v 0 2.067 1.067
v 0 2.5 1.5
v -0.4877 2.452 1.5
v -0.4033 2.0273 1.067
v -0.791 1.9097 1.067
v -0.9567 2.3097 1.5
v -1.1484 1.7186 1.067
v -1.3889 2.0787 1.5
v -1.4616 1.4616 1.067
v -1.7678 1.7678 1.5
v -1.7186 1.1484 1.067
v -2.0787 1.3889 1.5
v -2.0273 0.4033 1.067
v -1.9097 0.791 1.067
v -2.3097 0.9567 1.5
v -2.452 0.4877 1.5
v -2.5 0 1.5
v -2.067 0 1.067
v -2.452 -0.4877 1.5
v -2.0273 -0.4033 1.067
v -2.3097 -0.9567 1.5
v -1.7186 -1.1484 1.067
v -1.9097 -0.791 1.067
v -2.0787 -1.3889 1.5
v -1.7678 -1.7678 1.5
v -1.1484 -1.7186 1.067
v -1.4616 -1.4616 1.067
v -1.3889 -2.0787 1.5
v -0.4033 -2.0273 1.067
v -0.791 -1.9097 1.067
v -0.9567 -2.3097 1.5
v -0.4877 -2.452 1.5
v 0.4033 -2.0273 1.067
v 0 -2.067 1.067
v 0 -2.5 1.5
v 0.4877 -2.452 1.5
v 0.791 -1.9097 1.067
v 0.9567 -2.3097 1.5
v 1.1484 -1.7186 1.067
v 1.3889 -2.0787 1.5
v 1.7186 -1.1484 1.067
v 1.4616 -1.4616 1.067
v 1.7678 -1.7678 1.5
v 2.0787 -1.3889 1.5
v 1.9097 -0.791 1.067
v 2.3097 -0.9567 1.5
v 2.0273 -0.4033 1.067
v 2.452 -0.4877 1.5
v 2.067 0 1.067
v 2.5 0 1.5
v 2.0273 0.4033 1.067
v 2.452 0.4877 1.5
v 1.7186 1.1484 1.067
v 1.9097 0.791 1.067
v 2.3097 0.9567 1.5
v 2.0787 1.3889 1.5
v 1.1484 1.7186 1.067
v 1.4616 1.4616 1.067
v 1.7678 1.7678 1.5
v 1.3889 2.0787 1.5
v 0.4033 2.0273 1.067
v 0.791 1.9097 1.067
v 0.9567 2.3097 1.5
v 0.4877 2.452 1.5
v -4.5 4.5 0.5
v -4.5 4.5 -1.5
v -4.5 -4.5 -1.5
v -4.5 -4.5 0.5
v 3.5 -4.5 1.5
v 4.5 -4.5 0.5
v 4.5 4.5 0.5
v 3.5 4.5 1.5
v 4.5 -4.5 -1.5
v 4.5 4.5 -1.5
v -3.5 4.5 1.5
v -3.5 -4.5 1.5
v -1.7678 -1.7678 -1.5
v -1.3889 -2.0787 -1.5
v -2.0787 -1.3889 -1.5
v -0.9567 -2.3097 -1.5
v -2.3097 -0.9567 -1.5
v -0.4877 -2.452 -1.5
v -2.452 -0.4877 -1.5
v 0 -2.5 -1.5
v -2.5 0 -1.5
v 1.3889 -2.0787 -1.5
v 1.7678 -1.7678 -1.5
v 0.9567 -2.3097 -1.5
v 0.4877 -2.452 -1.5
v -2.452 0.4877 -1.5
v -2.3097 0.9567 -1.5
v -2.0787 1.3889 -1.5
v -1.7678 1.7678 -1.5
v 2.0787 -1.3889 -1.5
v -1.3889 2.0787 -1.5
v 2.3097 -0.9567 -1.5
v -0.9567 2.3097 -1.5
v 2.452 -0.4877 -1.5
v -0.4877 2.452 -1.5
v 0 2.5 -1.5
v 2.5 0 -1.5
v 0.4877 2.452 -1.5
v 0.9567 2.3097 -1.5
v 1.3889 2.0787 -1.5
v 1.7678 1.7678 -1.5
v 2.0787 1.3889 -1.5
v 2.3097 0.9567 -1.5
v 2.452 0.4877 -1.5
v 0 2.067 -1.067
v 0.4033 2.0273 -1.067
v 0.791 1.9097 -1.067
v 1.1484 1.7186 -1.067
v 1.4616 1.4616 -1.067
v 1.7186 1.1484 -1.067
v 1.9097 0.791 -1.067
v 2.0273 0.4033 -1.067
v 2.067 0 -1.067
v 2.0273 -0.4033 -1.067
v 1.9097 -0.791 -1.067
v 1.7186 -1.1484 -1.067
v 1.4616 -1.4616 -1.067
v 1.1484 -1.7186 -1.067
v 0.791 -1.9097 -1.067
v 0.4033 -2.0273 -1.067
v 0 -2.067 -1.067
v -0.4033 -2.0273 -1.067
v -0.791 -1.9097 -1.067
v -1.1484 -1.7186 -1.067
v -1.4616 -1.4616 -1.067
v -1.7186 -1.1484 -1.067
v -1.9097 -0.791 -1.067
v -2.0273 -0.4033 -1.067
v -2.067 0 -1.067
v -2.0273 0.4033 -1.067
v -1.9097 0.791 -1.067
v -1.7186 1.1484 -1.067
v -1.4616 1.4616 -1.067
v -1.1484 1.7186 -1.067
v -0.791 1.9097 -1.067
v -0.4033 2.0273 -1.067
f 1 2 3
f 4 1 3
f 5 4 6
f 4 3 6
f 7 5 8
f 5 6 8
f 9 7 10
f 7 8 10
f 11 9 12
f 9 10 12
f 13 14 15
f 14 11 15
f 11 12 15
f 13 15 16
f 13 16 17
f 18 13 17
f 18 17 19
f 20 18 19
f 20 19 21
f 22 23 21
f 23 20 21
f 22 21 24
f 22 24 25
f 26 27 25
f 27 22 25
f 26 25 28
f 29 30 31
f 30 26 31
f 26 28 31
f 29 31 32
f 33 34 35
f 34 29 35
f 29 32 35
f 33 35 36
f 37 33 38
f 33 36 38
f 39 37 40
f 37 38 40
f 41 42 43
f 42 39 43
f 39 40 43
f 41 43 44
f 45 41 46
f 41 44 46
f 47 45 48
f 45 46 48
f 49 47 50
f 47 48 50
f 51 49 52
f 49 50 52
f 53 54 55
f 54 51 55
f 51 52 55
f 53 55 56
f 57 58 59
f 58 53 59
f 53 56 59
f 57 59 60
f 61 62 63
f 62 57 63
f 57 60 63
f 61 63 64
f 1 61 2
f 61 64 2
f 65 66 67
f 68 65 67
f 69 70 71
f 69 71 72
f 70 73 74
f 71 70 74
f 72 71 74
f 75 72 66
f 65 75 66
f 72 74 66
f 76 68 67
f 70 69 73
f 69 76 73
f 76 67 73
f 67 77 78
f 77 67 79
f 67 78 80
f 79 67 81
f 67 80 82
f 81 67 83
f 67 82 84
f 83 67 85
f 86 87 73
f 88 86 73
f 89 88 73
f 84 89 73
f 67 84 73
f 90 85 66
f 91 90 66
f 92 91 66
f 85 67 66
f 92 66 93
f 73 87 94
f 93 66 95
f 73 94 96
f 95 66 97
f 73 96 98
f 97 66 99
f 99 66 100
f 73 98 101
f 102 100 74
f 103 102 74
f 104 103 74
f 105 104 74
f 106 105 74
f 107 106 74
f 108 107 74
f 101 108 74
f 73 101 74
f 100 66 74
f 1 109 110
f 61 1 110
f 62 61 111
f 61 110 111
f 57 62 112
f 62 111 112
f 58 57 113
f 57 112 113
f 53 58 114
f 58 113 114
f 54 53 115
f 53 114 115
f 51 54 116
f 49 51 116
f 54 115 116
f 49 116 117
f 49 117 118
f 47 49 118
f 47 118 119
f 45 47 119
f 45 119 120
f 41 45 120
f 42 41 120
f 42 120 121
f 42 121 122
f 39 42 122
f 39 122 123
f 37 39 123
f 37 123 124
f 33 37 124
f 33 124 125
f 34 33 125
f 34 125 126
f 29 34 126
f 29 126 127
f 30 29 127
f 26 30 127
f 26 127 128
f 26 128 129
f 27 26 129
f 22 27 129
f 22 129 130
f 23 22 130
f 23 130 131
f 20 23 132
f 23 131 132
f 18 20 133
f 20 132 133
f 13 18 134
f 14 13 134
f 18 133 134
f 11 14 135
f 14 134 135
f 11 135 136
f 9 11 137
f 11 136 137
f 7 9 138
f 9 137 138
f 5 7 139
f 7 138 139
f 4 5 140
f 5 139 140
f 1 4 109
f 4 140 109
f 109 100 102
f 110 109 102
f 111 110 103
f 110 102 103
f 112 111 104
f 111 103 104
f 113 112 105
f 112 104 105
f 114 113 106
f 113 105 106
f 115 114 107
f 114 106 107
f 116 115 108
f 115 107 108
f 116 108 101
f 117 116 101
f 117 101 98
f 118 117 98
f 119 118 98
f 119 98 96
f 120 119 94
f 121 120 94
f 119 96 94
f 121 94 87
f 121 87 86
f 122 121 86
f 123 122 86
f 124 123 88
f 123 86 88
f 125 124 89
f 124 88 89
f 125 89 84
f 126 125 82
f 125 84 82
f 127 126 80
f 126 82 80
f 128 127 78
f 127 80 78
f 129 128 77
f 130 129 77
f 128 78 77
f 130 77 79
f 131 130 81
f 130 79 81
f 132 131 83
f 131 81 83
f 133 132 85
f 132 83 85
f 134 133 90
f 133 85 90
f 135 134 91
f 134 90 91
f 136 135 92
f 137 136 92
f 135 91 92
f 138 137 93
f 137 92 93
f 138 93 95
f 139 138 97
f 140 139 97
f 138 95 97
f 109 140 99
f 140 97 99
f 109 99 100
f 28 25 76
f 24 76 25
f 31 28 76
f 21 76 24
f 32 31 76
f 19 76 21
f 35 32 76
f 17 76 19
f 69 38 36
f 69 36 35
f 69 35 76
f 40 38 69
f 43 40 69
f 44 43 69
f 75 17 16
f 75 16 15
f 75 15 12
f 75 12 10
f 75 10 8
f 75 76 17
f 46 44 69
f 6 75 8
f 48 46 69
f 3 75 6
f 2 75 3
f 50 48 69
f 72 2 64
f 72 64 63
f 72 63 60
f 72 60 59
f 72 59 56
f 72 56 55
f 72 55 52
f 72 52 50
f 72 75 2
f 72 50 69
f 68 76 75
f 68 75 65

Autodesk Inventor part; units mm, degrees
ref_plane "YZ Plane" through (0, 0, 0) normal (1, 0, 0) x (0, 1, 0)
ref_plane "XZ Plane" through (0, 0, 0) normal (0, 1, 0) x (-1, 0, 0)
sketch "Sketch_1" plane through (0, 0, 0) normal (0, 0, 1) x (1, 0, 0)
  line L0 (-4.5, 4.5) -> (-4.5, -4.5)
  line L1 (-4.5, -4.5) -> (4.5, -4.5)
  line L2 (4.5, -4.5) -> (4.5, 4.5)
  line L3 (4.5, 4.5) -> (-4.5, 4.5)
extrude "Extrusion1" add sketch "Sketch_1" along normal mid plane 3
sketch "Sketch_2" plane through (0, 0, 0) normal (1, 0, 0) x (0, 1, 0)
  line L0 (0, -1.5) -> (0, 1.5)
  line L1 (0, 1.5) -> (2.5, 1.5)
  line L2 (2.5, 1.5) -> (2.067, 1.067)
  line L3 (2.067, 1.067) -> (2.067, -1.067)
  line L4 (2.067, -1.067) -> (2.5, -1.5)
  line L5 (2.5, -1.5) -> (0, -1.5)
  line L6 (0, -1.5) -> (0, 1.5)
revolve "Revolution1" cut sketch "Sketch_2" angle 360 about axis through (0, 0, -1.5) along (0, 0, -1)
thread "Thread1" size "M5x0.8" class "6H" standard "ISO Metric profile" full length
sketch "Sketch_3" plane through (0, 0, 0) normal (0, 1, 0) x (-1, 0, 0)
  line L0 (4.5, 0.5) -> (4.5, 2.5)
  line L1 (4.5, 2.5) -> (-4.5, 2.5)
  line L2 (-4.5, 2.5) -> (-4.5, 0.5)
  line L3 (-4.5, 0.5) -> (-3.5, 1.5)
  line L4 (-3.5, 1.5) -> (3.5, 1.5)
  line L5 (3.5, 1.5) -> (4.5, 0.5)
extrude "Extrusion2" cut sketch "Sketch_3" along normal mid plane 18
ref_plane "Work Plane1" through (-4.5, 0, -1.5) normal (0, 1, 0) x (1, 0, 0)
properties part number "T-Nut Block M5  Threads"
